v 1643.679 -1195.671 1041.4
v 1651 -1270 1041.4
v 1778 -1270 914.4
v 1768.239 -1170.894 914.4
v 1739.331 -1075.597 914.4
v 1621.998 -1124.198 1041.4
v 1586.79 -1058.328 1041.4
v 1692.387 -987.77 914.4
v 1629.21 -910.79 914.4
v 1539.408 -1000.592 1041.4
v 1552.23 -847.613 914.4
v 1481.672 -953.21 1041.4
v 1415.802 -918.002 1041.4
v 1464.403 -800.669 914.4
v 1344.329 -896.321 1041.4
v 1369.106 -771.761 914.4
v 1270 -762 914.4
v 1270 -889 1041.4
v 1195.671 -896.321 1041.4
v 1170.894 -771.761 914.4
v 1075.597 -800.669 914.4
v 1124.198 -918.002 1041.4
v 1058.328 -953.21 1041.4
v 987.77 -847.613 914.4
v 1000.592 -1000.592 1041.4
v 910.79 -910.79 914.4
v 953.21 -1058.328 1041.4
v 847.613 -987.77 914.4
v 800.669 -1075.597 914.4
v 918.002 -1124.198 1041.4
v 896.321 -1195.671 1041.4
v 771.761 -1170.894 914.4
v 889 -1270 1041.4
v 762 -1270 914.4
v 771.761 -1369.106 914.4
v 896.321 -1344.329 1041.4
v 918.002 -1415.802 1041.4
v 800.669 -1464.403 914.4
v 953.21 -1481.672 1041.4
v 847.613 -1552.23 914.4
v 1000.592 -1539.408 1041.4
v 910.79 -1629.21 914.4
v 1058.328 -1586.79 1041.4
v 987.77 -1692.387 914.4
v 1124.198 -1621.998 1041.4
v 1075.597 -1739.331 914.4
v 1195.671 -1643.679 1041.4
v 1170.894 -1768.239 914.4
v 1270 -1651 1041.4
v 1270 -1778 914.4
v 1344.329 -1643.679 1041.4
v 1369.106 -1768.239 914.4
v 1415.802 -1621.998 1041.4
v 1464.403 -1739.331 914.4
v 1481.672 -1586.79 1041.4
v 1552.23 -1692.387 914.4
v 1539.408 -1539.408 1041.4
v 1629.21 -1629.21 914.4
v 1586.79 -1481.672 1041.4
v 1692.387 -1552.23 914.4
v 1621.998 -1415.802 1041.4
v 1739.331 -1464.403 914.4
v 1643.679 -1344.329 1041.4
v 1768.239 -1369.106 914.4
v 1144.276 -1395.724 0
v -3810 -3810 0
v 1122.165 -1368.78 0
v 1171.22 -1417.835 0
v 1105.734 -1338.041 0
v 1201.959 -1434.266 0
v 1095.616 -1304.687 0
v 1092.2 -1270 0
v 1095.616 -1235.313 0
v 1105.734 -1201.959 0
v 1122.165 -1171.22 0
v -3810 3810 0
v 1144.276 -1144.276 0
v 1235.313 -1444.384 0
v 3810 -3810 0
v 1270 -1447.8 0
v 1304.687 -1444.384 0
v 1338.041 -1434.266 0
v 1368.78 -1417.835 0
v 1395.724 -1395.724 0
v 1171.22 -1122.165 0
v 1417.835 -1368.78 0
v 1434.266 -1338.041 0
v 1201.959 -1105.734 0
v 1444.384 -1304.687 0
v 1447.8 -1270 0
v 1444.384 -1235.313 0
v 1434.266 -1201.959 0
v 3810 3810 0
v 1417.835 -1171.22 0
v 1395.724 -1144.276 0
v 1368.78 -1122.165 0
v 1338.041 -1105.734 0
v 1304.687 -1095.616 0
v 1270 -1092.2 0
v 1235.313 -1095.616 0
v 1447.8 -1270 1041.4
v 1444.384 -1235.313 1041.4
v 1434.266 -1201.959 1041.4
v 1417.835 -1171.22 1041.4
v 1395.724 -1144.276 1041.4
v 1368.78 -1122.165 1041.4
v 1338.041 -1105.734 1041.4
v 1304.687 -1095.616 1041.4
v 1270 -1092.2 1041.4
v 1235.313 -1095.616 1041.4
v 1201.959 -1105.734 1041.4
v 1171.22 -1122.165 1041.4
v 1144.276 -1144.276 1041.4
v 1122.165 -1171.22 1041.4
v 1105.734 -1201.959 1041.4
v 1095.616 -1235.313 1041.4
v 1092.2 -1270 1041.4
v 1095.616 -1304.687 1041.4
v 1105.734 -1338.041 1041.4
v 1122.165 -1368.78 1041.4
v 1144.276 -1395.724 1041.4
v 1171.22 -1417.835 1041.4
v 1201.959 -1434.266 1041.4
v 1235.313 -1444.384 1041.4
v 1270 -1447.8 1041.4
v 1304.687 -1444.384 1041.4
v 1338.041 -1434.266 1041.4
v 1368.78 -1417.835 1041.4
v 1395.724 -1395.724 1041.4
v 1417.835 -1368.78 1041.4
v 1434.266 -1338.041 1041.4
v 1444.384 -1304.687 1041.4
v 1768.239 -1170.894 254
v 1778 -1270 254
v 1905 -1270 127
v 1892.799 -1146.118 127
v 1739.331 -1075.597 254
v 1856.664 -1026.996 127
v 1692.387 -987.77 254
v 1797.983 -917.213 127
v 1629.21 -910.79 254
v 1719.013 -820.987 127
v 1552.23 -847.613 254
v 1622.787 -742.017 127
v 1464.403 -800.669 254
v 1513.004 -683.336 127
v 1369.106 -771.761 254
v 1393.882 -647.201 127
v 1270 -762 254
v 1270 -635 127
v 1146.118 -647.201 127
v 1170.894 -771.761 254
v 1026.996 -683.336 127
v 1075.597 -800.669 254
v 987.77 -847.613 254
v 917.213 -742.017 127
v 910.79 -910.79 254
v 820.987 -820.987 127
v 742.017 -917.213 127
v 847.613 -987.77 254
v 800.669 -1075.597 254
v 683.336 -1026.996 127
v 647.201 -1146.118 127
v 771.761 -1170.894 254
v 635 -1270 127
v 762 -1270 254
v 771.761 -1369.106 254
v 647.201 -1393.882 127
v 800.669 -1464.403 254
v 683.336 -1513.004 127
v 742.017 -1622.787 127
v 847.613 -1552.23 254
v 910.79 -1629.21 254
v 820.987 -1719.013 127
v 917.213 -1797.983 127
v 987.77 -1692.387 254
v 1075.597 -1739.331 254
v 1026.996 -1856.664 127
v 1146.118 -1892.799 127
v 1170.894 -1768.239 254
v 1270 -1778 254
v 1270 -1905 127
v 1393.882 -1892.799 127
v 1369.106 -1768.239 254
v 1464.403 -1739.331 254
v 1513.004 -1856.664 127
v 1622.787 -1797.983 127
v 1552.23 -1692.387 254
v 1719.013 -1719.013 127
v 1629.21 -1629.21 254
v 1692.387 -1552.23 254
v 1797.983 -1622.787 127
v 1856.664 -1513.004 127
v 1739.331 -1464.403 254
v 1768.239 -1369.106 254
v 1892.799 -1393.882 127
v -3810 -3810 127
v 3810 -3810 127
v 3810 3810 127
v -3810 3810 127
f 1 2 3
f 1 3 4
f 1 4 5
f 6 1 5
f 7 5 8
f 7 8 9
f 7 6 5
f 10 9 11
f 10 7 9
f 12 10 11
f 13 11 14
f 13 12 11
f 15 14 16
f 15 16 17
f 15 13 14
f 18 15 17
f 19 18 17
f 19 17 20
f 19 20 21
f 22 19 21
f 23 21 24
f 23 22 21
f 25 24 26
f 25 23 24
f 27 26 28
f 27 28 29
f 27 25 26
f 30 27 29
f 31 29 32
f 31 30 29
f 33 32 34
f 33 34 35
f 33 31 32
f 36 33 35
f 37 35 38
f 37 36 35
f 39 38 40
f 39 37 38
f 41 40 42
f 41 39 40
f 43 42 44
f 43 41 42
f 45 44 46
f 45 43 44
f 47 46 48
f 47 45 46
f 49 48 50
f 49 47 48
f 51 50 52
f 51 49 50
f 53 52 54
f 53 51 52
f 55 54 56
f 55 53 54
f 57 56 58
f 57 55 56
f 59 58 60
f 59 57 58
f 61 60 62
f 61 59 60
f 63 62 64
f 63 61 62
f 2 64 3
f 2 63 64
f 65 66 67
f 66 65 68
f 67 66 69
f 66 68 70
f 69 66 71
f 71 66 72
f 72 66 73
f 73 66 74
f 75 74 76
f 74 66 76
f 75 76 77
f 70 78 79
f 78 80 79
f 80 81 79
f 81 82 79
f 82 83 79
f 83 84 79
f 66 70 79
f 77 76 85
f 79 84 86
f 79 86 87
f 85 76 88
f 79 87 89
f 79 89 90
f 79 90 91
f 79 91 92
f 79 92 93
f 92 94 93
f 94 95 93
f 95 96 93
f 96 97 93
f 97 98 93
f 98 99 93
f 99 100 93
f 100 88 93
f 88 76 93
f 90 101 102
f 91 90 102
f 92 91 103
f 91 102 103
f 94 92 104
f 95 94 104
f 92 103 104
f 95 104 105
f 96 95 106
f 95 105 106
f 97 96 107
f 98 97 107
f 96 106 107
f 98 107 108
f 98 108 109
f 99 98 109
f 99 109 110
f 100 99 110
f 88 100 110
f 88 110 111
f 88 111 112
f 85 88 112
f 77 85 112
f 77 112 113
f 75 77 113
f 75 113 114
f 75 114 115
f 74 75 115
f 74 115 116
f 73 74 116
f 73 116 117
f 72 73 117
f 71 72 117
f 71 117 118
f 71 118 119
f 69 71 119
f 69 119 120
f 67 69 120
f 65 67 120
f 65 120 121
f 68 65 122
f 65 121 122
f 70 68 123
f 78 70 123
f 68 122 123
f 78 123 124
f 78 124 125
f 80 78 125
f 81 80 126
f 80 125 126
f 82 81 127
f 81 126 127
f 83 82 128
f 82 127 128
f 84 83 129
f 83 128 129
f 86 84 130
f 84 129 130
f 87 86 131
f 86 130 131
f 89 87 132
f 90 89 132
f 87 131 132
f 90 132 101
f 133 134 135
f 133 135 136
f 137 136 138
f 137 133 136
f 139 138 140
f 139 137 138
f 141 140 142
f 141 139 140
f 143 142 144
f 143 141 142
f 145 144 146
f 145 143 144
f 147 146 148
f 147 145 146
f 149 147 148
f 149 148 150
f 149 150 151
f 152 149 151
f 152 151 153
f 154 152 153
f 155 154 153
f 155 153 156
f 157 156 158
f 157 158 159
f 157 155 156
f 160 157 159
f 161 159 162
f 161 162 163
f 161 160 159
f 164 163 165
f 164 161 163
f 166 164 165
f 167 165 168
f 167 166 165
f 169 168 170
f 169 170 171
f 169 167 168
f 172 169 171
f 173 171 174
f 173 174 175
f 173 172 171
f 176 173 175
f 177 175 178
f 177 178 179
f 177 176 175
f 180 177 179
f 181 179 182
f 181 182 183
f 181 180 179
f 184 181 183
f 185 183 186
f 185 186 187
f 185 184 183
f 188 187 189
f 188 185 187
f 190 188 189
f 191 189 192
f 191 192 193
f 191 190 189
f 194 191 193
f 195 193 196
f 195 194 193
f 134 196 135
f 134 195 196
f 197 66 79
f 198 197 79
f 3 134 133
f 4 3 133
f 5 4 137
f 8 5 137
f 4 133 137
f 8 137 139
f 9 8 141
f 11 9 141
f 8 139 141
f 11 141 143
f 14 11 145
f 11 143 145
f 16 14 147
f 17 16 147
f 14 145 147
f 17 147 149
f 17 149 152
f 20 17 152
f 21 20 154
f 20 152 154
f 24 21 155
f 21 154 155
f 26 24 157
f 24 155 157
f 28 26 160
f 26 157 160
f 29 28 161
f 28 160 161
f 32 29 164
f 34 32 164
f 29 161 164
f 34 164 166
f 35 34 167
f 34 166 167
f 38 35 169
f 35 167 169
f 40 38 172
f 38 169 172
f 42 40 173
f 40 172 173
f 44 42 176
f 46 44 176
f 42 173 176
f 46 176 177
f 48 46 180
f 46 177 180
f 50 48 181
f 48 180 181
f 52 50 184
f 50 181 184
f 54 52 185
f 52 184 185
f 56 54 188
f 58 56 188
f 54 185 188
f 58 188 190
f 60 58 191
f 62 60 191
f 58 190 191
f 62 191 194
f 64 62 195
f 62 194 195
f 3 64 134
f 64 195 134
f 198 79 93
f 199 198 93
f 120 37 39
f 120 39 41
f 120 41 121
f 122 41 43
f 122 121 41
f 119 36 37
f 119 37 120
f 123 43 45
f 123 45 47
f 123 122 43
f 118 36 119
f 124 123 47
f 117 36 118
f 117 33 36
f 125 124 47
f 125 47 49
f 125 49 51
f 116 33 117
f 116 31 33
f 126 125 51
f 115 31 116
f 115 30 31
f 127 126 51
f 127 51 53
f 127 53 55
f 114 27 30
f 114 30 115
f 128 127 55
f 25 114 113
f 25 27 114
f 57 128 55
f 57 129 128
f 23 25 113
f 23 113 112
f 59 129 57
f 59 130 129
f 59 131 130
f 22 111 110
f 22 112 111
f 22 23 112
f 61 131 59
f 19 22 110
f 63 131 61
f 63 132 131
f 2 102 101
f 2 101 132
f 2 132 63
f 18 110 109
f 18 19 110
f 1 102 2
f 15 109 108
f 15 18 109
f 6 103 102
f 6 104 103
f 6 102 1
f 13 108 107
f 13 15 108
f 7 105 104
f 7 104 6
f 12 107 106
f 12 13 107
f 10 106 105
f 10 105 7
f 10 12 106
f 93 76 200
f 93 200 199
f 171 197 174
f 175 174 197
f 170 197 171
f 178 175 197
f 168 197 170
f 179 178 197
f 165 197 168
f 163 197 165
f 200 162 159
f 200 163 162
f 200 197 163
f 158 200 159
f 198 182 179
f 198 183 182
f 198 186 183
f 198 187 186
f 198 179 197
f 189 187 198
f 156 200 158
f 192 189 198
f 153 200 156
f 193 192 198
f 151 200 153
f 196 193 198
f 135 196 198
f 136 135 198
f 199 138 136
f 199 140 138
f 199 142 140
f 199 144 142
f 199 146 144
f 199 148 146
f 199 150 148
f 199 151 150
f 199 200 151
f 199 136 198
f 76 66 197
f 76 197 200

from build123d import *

# Parameters (mm, degrees)
F0_W     = 7620
F0_H     = 7620
F1_DEPTH = 127
F2_R     = 508
F3_DEPTH = 914.4
F4_SIZE  = 127
F5_R     = 177.8
F6_DEPTH = 1041.401


with BuildPart() as f1:
    # F0 (on Top) → F1 (new body)
    with BuildSketch(Plane.XY):
        Rectangle(F0_W, F0_H)
    extrude(amount=F1_DEPTH)

    # F2 (on face) → F3 (join)
    with BuildSketch(Plane.XY.offset(127)):
        with Locations((1270, -1270)):
            Circle(F2_R)
    extrude(amount=F3_DEPTH)

    # F4
    f4_edges = [f1.edges().sort_by_distance(p)[0] for p in [
        (762, -1270, 1041.4),
        (762, -1270, 127),
    ]]
    chamfer(f4_edges, length=F4_SIZE)

    # F5 (on face) → F6 (cut, through all)
    with BuildSketch(Plane.XY.offset(1041.4)):
        with Locations((1270, -1270)):
            Circle(F5_R)
    extrude(amount=-F6_DEPTH, mode=Mode.SUBTRACT)


solid = f1.part
